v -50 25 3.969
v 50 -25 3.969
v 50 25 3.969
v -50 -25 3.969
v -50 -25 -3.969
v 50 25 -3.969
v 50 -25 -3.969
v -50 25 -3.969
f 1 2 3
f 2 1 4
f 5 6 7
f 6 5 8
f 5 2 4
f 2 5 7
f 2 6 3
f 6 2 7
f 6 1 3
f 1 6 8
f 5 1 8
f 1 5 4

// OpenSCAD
$fn = 64;

// Sheet/plate: thickness ~5/16" = 0.3125 in = 7.9375 mm
inch = 25.4;
thickness = 5/16 * inch;   // 7.9375 mm

length = 100; // mm
width  = 50;  // mm

module sheet_plate(l=length, w=width, t=thickness) {
    // One connected solid, centered at origin
    cube([l, w, t], center=true);
}

sheet_plate();
